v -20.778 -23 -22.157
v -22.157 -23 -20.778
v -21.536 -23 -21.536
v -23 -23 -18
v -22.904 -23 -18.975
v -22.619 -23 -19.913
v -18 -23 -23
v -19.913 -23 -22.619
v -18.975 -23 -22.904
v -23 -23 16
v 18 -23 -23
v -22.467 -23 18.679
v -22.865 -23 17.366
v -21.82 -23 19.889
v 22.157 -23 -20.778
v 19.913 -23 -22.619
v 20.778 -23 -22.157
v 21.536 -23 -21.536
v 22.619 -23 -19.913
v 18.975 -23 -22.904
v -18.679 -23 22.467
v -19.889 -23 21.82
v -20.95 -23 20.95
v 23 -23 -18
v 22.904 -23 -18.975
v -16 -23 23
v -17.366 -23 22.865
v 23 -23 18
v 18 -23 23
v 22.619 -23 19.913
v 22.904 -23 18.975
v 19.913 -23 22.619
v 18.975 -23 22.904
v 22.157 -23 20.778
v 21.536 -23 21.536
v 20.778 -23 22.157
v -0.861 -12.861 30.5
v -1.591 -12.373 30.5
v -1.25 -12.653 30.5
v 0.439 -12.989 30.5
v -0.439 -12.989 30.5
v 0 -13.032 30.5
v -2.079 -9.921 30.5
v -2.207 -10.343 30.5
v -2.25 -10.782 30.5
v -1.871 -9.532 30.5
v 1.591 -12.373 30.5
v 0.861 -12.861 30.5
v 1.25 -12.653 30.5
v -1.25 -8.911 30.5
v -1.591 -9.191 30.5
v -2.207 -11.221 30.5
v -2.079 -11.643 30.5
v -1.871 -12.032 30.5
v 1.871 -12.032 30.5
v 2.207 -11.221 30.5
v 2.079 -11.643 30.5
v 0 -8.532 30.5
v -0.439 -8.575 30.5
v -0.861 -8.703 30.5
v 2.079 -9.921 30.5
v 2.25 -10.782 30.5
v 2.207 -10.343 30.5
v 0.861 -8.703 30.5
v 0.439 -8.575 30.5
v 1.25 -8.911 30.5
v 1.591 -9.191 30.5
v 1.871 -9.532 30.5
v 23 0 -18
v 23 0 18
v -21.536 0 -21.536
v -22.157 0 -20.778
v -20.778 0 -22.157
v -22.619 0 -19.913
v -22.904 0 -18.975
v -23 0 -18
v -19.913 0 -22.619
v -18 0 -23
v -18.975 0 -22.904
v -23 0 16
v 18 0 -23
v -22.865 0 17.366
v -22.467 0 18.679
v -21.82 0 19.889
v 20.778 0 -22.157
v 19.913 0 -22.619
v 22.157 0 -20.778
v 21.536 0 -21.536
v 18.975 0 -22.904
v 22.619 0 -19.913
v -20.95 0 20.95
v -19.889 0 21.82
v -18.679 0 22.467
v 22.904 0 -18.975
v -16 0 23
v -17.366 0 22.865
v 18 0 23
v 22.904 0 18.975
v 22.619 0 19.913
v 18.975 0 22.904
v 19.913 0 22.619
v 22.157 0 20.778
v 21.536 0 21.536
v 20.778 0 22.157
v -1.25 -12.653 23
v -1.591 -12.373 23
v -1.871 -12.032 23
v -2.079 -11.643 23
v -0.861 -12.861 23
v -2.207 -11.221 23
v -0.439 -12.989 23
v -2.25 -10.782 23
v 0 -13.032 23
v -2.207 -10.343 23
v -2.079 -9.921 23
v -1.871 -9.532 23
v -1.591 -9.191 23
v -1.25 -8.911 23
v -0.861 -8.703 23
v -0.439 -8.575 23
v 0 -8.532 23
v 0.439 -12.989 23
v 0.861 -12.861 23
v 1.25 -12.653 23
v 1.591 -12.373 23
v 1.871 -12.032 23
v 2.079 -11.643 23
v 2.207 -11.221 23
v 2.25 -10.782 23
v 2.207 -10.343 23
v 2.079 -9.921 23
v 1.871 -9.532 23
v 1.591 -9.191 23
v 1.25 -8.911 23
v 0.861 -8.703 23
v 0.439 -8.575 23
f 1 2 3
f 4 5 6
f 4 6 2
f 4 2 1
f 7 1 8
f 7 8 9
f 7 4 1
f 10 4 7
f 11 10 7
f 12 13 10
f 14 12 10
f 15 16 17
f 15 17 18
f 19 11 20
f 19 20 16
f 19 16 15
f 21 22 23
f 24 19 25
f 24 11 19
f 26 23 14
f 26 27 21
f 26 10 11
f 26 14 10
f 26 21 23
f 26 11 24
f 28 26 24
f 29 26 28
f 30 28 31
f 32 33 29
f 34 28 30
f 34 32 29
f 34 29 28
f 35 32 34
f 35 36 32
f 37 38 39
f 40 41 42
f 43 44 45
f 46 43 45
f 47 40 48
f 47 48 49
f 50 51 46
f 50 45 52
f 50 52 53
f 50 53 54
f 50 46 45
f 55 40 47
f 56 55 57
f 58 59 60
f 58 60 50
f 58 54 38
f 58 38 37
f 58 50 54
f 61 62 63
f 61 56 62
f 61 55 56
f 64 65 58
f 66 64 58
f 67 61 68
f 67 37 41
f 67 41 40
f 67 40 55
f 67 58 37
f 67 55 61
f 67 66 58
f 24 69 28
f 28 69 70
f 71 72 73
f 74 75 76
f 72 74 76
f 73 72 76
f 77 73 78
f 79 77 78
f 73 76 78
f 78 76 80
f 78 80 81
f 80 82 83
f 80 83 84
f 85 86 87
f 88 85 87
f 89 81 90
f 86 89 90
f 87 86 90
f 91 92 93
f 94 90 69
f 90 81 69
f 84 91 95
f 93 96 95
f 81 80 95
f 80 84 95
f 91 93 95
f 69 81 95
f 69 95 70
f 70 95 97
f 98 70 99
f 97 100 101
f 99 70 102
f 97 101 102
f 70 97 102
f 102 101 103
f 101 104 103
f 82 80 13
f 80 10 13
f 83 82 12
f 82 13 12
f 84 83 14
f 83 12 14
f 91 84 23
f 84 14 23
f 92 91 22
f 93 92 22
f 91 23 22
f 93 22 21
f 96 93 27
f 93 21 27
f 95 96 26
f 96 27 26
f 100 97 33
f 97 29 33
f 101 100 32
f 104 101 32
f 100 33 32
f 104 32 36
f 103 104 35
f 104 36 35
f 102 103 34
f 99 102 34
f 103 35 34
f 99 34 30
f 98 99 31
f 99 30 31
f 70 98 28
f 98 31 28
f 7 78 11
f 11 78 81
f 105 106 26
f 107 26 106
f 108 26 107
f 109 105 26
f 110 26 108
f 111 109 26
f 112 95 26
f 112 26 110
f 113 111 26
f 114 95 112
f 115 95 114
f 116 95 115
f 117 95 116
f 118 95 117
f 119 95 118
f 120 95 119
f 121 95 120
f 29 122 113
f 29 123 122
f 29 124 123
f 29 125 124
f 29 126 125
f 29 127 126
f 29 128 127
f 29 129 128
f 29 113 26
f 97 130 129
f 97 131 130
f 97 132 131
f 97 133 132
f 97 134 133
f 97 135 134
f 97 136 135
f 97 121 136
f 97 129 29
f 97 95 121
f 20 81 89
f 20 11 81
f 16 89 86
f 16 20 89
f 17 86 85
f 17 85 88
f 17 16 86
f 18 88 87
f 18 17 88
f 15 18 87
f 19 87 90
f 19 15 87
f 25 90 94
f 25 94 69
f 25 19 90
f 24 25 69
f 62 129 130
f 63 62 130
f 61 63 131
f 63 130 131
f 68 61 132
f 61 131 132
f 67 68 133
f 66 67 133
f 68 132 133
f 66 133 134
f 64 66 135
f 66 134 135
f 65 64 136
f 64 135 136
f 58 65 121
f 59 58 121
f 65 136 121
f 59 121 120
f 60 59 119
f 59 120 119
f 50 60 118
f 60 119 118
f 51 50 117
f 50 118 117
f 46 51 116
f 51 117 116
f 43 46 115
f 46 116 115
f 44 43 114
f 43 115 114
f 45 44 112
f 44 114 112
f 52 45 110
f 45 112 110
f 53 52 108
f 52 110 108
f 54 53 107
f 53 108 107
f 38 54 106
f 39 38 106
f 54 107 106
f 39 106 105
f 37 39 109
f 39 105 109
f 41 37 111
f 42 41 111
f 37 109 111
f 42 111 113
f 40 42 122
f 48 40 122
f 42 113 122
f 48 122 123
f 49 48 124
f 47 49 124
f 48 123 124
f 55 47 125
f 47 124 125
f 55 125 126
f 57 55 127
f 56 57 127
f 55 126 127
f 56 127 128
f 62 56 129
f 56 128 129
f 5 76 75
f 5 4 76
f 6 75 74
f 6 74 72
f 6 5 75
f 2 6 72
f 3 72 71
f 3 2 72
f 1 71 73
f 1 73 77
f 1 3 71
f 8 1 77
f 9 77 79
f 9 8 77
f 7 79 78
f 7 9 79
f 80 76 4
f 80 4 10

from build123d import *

# Parameters (mm, degrees)
F0_W     = 46
F0_H     = 46
F1_DEPTH = 23
F2_R     = 7
F3_R     = 5
F4_R     = 2.25
F5_DEPTH = 7.5


with BuildPart() as f1:
    # F0 (on Front) → F1 (new body)
    with BuildSketch(Plane.XZ):
        Rectangle(F0_W, F0_H)
    extrude(amount=F1_DEPTH)

    # F2
    f2_edges = [f1.edges().sort_by_distance(p)[0] for p in [
        (-23, -11.5, 23),
    ]]
    fillet(f2_edges, radius=F2_R)

    # F3
    f3_edges = [f1.edges().sort_by_distance(p)[0] for p in [
        (23, -11.5, 23),
        (23, -11.5, -23),
        (-23, -11.5, -23),
    ]]
    fillet(f3_edges, radius=F3_R)

    # F4 (on face) → F5 (join)
    with BuildSketch(Plane.XY.offset(23)):
        with Locations((0, -10.782062)):
            Circle(F4_R)
    extrude(amount=F5_DEPTH)


solid = f1.part
